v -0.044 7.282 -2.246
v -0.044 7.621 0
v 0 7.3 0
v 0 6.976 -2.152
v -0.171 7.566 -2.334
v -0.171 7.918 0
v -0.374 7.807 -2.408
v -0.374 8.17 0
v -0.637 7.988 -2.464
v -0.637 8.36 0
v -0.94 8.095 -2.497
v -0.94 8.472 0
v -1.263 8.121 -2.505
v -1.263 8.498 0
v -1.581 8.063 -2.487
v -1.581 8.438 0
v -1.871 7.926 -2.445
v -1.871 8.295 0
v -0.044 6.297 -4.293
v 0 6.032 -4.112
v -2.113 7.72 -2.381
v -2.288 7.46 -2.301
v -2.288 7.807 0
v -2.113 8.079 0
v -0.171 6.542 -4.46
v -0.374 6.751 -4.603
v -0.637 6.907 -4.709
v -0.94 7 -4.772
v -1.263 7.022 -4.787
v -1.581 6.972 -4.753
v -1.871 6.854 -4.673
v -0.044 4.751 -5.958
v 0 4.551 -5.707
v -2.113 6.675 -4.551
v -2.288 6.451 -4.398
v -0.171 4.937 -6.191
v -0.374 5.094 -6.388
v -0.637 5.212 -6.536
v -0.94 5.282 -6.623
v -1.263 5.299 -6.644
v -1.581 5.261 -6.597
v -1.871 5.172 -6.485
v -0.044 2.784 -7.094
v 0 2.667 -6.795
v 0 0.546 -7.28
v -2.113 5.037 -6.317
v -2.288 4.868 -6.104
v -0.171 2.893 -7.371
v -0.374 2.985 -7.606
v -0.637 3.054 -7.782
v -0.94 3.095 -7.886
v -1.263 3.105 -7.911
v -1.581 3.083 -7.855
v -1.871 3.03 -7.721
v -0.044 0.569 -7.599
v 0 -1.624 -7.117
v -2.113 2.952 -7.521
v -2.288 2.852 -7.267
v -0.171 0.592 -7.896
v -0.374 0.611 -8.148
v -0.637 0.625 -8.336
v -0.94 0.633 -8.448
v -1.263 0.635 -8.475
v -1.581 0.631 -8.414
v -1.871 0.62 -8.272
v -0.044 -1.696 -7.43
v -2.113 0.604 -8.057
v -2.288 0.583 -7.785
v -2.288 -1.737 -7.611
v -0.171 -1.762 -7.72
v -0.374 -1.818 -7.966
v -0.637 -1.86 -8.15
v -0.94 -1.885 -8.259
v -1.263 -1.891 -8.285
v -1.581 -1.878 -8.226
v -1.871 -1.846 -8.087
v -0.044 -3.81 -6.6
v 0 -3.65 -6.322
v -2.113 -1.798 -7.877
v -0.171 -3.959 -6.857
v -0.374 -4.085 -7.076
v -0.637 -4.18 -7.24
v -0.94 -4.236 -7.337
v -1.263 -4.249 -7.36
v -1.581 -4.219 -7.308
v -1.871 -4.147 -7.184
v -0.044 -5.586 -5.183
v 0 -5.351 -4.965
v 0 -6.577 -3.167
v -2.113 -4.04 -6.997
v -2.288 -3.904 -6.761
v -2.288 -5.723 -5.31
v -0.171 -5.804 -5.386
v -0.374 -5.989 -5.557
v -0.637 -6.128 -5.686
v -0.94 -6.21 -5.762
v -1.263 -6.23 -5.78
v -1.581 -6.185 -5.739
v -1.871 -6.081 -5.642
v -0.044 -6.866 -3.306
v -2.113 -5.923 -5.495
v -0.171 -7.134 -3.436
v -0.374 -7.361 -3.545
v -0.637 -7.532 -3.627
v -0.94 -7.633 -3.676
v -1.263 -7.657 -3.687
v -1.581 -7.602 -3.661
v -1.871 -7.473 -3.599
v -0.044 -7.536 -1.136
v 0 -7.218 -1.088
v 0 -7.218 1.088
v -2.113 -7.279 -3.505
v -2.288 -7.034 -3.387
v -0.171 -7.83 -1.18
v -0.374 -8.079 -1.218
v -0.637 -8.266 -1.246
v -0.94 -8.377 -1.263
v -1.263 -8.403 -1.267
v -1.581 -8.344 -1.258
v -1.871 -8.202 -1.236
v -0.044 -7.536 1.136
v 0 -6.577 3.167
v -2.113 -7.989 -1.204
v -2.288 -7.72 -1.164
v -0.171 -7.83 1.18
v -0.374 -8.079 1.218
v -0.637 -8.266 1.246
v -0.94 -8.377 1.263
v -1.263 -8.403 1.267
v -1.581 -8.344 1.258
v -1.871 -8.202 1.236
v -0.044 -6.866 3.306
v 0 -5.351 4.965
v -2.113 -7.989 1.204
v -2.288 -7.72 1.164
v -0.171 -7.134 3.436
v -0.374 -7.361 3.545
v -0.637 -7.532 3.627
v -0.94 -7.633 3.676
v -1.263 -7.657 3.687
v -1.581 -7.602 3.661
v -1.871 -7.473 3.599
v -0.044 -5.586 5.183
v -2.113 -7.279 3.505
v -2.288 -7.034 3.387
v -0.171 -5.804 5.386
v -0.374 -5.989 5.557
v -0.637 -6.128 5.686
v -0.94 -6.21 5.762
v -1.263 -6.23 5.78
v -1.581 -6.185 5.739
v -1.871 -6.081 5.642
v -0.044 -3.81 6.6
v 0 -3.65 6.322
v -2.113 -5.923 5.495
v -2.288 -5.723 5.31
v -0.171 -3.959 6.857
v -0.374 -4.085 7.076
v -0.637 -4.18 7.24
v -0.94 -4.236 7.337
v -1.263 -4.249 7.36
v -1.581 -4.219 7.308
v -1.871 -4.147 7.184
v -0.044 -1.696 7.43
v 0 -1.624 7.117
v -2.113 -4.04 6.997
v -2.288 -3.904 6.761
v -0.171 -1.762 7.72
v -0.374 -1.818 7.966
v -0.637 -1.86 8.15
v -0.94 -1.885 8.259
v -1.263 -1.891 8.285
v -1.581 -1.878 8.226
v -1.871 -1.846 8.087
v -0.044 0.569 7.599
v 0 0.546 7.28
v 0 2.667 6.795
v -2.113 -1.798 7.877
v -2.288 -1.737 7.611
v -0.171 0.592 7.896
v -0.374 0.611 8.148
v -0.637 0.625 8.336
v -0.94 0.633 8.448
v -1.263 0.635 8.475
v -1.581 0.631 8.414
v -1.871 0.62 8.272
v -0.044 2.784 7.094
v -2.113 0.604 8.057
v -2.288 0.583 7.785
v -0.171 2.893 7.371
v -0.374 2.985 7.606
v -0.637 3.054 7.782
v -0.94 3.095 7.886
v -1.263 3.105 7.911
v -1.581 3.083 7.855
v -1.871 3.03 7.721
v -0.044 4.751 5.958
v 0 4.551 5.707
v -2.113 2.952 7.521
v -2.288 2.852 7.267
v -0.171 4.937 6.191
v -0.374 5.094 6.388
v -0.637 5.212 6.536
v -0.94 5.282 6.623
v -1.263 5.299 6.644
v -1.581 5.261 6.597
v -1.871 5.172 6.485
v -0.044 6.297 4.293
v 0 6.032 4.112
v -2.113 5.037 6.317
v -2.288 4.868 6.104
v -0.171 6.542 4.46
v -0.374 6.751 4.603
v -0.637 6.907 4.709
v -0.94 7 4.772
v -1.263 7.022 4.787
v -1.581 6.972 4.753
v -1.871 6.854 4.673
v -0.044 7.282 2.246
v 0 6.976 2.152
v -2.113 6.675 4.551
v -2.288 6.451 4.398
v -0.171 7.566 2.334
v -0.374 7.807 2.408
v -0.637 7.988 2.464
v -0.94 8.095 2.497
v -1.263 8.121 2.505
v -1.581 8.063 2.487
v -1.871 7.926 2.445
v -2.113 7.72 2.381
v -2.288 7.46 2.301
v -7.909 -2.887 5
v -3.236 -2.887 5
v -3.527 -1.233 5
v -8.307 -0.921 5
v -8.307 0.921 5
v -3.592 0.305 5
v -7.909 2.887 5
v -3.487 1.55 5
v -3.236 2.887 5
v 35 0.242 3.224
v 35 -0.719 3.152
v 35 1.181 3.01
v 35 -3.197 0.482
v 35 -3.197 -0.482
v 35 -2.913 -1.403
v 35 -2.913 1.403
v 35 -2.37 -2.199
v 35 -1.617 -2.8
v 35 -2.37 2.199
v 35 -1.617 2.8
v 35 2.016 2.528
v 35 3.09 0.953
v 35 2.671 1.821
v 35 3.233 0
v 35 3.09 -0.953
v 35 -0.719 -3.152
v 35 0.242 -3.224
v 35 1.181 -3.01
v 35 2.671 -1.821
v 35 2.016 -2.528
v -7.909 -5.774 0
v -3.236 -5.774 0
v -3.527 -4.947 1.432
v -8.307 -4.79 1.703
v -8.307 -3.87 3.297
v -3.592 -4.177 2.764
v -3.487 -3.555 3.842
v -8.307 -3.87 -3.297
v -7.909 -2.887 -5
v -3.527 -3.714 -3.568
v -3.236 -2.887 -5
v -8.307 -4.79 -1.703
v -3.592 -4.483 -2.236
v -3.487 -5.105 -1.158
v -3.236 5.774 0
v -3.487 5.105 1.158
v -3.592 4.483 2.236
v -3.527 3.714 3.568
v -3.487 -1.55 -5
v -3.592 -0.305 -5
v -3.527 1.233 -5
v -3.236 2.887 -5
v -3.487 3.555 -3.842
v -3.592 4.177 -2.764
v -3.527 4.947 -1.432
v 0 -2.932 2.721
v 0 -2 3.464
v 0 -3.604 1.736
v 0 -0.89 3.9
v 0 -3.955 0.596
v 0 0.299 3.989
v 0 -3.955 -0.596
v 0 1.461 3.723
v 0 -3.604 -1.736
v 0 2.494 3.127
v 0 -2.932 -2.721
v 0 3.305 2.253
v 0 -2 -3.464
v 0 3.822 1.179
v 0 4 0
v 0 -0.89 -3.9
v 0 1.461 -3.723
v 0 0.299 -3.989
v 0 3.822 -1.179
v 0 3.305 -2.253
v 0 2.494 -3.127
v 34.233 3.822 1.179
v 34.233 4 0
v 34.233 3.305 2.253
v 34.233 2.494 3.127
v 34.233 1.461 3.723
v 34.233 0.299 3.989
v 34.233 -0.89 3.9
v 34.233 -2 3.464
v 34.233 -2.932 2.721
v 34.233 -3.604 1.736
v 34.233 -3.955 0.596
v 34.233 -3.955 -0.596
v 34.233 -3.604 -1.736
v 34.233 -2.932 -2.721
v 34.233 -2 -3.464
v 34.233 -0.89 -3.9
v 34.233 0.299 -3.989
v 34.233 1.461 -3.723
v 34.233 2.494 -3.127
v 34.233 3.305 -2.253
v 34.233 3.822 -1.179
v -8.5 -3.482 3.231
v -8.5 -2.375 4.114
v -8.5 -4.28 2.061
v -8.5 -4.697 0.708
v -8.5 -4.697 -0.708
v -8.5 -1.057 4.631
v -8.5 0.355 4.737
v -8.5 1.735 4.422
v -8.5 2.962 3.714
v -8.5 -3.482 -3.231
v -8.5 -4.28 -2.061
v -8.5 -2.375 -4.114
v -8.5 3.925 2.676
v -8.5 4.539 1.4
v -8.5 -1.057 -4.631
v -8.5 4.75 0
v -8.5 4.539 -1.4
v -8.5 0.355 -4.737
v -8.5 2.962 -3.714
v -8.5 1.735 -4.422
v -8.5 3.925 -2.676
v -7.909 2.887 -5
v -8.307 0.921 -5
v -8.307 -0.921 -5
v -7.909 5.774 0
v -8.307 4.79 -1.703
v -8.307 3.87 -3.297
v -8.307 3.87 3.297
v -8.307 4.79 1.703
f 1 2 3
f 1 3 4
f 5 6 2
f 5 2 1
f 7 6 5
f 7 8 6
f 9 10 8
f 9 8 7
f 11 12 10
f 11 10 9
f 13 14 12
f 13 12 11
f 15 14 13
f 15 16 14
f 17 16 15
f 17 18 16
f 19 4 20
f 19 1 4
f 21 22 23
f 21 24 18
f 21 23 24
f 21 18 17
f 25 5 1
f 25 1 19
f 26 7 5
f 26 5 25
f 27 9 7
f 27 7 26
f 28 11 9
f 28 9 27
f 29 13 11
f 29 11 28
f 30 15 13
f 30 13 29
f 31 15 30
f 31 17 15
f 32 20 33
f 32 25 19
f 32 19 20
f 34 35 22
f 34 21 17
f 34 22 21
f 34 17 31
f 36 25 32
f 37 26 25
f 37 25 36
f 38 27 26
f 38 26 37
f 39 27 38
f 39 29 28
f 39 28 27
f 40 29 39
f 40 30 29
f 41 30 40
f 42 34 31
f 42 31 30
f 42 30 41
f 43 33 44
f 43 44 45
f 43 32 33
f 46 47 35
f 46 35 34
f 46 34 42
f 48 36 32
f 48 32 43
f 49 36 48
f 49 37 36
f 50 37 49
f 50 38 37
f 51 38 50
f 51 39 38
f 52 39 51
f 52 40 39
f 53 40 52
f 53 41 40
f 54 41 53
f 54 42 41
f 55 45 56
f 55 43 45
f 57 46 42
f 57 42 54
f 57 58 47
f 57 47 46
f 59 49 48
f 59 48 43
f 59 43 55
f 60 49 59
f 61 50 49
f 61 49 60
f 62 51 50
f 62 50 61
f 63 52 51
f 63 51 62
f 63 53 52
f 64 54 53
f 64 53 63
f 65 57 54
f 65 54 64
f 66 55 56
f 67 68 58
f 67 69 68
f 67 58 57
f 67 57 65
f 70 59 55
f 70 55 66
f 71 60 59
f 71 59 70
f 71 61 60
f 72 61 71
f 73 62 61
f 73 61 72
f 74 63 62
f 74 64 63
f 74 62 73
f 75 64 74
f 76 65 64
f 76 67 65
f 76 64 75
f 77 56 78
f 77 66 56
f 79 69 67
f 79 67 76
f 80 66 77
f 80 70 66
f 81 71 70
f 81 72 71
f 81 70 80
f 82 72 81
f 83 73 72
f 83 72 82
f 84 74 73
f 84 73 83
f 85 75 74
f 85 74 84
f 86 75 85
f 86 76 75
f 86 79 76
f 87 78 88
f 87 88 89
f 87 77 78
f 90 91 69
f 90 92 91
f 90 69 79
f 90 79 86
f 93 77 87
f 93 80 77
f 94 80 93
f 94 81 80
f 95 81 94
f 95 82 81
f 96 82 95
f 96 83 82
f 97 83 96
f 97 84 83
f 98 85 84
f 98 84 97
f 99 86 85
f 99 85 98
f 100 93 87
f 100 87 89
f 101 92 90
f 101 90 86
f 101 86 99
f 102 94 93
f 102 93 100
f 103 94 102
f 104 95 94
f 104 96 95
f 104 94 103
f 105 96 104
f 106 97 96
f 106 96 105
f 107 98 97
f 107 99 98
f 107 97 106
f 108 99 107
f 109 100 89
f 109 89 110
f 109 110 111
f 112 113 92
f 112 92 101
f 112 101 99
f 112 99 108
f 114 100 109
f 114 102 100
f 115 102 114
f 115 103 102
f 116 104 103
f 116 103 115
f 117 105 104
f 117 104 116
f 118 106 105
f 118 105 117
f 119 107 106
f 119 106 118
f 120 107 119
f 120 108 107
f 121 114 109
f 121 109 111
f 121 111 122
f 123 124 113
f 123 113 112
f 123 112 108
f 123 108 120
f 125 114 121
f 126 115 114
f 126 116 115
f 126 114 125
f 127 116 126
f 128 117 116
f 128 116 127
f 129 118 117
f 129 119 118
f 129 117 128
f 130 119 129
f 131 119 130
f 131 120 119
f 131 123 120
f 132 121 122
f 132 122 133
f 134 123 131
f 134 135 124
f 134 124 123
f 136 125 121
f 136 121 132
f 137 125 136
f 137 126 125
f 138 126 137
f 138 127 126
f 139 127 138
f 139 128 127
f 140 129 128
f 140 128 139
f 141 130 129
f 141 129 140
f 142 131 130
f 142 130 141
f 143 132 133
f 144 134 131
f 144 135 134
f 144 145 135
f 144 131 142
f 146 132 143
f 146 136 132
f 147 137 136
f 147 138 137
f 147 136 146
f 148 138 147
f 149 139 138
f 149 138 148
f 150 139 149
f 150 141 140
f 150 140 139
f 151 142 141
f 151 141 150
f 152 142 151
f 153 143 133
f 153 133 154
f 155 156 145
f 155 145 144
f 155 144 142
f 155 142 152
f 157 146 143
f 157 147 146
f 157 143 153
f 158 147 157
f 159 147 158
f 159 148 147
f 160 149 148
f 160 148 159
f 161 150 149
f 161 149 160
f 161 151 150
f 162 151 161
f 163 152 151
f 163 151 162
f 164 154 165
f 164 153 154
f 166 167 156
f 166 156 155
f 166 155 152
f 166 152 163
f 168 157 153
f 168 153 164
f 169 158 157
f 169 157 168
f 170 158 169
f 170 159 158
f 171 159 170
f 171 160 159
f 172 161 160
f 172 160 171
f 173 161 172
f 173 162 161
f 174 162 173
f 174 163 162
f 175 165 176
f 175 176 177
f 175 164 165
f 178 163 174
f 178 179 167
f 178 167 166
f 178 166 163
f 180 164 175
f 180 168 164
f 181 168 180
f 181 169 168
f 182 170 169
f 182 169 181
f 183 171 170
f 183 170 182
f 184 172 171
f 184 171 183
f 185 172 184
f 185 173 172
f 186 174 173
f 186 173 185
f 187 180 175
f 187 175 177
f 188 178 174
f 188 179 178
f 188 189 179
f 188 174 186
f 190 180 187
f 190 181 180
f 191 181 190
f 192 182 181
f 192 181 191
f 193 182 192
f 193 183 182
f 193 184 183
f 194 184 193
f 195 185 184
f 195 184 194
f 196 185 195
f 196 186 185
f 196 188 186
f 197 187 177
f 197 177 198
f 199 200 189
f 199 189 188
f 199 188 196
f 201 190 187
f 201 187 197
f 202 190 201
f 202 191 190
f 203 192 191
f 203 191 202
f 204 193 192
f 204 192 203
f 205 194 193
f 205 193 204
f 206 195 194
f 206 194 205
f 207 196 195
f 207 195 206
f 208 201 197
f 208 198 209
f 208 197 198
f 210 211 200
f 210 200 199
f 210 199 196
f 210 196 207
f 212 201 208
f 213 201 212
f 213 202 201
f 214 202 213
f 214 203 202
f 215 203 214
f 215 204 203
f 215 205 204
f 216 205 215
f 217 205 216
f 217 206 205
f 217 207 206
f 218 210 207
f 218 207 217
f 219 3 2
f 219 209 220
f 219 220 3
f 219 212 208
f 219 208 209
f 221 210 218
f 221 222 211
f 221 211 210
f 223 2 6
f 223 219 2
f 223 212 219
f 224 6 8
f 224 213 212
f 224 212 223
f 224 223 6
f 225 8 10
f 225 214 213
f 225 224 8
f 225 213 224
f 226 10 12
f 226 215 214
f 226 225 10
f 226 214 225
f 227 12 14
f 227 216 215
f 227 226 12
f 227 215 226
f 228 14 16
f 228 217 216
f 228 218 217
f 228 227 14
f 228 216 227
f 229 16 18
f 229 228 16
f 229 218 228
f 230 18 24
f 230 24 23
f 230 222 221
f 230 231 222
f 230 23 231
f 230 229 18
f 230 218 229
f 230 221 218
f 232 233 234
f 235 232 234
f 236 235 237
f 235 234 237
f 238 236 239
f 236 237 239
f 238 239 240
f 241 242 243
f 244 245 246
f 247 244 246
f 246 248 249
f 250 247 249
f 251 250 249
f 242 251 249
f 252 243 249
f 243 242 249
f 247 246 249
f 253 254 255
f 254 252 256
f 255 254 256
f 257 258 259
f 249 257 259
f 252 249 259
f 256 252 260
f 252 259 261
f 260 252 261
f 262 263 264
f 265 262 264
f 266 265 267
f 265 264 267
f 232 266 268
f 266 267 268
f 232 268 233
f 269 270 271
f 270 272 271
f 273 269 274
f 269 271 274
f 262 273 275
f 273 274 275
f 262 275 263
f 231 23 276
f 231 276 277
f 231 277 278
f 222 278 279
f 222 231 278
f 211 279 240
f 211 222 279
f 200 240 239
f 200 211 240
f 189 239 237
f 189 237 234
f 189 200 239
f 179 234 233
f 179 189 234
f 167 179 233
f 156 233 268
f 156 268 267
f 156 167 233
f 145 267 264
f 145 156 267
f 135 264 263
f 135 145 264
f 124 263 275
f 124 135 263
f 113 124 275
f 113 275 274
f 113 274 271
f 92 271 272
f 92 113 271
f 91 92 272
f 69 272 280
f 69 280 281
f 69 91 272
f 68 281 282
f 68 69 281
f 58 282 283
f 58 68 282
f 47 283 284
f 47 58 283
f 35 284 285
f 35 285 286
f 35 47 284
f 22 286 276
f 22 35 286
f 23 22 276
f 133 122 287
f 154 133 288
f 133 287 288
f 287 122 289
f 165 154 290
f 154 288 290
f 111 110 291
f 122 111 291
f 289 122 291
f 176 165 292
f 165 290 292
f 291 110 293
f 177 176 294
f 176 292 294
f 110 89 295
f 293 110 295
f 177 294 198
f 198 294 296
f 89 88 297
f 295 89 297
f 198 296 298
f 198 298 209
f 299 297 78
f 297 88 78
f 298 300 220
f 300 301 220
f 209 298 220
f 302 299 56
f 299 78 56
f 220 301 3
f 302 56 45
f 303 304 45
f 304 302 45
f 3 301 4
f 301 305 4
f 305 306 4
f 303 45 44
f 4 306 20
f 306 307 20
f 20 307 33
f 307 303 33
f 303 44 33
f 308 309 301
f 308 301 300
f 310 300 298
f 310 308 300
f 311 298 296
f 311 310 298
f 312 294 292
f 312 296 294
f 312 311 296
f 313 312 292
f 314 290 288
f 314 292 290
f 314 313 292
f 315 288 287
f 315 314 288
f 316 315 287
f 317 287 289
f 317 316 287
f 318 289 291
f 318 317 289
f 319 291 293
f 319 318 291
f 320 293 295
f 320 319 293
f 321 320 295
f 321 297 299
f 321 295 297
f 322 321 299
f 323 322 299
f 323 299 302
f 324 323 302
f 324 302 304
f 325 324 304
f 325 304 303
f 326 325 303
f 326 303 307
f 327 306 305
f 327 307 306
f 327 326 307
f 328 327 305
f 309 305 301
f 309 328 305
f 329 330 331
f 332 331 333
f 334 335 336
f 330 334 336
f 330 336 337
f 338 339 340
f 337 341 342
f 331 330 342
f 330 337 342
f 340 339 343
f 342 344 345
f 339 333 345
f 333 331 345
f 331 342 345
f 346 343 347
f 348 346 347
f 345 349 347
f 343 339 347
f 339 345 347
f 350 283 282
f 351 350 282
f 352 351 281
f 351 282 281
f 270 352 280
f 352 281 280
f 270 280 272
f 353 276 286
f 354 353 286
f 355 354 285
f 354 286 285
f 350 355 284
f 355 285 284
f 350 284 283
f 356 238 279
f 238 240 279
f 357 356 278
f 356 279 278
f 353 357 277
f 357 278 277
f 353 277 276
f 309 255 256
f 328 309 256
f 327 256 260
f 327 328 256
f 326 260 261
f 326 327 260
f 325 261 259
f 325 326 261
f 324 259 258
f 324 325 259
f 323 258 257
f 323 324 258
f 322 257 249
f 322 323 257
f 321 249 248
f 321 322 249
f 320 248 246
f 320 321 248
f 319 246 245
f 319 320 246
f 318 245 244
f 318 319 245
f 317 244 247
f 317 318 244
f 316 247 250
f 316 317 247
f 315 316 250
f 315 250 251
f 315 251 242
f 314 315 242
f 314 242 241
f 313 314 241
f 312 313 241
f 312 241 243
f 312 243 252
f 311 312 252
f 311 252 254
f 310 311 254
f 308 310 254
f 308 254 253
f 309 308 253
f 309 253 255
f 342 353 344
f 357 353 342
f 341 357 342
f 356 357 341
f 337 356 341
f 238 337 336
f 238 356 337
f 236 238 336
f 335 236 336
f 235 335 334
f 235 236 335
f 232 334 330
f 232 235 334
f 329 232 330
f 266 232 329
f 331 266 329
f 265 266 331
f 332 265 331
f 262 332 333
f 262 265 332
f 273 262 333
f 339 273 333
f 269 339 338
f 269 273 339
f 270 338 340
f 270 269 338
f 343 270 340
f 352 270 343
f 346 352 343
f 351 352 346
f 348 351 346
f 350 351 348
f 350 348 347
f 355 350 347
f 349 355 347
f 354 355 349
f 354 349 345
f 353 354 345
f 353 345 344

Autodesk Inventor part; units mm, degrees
ref_plane "YZ Plane" through (0, 0, 0) normal (1, 0, 0) x (0, 1, 0)
ref_plane "XZ Plane" through (0, 0, 0) normal (0, 1, 0) x (-1, 0, 0)
sketch "Sketch1" plane through (0, 0, 0) normal (0, 0, 1) x (1, 0, 0)
  line L0 (-3.825, 0) -> (-3.825, 4.5101)
  line L1 (0, 7.3) -> (0, 4)
  line L2 (13, 4) -> (35, 4)
  line L3 (35, 4) -> (35, 0)
  line L4 (35, 0) -> (-3.825, 0)
  arc A0 (0, 7.3) -> (-2.2876, 7.8071) centre (-1.2, 7.3) ccw
  line L5 (0, -1.745) -> (0, 10.4702) projected
  line L6 (-11.59, 0) -> (42.765, 0) projected
  line L7 (0, 4) -> (0.0001, 4)
  line L8 (0.0001, 4) -> (0.0001, 4)
  line L9 (0.0001, 4) -> (12.2332, 4)
  line L10 (12.2332, 4) -> (13, 4)
  line L11 (-3.825, 4.5101) -> (-2.2876, 7.8071)
  line L12 (0.0001, 4) -> (13, 4) construction
  line L13 (13, 4) -> (13, 0) construction
  dimension "d0" = 1.2
  dimension "d1" = 35
  dimension "d2" = 22
  dimension "d3" = 17
  dimension "d4" = 8
  dimension "d5" = 3.825
  dimension "d15" = 8
  dimension "d16" = 8
  dimension "d17" = 0.0001
  dimension "d18" = 0.7668
  dimension "d19" = 25
revolve "Body" add sketch "Sketch1" angle 360 about axis through (35, 0, 0) along (-1, 0, 0)
sketch "Sketch2" plane through (0, 0, 0) normal (1, 0, 0) x (0, 0, -1)
  line L0 (5, 2.8868) -> (5, -2.8868)
  line L1 (5, -2.8868) -> (0, -5.7735)
  line L2 (0, -5.7735) -> (-5, -2.8868)
  line L3 (-5, -2.8868) -> (-5, 2.8868)
  line L4 (-5, 2.8868) -> (0, 5.7735)
  line L5 (0, 5.7735) -> (5, 2.8868)
  point P0 (0, 0)
  point P1 (0, 0)
  dimension "d23" = 10
extrude "Head" add sketch "Sketch2" against normal blind 8.5
sketch "Sketch3" plane through (0, 0, 0) normal (0, 0, 1) x (1, 0, 0)
  line L0 (-8.5, 4.75) -> (-8.5, 5.7735)
  line L1 (-8.5, 5.7735) -> (-7.9091, 5.7735)
  line L2 (-7.9091, 5.7735) -> (-8.5, 4.75)
  line L3 (-9.5528, 0) -> (-2.183, 0) projected
  line L4 (-8.5, 5.7735) -> (-8.5, 2.8868) projected
  line L5 (-3.2359, 5.7735) -> (-8.5, 5.7735) projected
  point P0 (-8.5, 2.8868)
  dimension "d8" = 30
  dimension "d22" = 9.5
revolve "Chamfer1" cut sketch "Sketch3" angle 360 about axis through (-10, 0, 0) along (1, 0, 0)
thread "Thread" size "M8x1.25" class "6g" standard "ISO Metric profile" length 22
chamfer "Chamfer2" distance 0.7668 distance2 0.7668 1 edges at (35, -4, 0) measured on face at (35, 1.5232, 1.2467)
ref_plane "Work Plane1" through (10.95, 0, 0) normal (0, 0, -1) x (1, 0, 0)
equation "\"d0\" = PHH"
equation "\"d1\" = NLG"
equation "\"d2\" = GEL"
equation "\"d3\" = LADI"
equation "\"d4\" = GD"
equation "\"d5\" = 0.45 * KOH"
equation "\"d15\" = SD2"
equation "\"d16\" = BDM"
equation "\"d18\" = GAL"
equation "\"d19\" = KEWI"
equation "\"d23\" = SW"
equation "\"d6\" = KOH"
equation "\"d8\" = ANG1"
equation "\"d22\" = SW0"
equation "\"d10\" = GEL"
equation "\"d13\" = -0.5 * SPD + 0.5 * GD"
equation "\"d14\" = GUL"
equation "\"NLG\" = 35"
equation "\"GD\" = NND"
equation "\"BDM\" = NND"
equation "\"KOH\" = 8.5"
equation "\"GEL\" = 22"
equation "\"LADI\" = 17"
equation "\"SW\" = 10"
equation "\"PHH\" = RR"
equation "\"SW0\" = 9.5"
equation "\"SPD\" = NND - 1.2269 * PTC"
equation "\"SD2\" = NND"
equation "\"SD\" = 0"
equation "\"ANG1\" = 30deg"
equation "\"KEWI\" = 25deg"
equation "\"GAL\" = 0.61345 * PTC"
equation "\"GUL\" = 0.61345 * PTC"
equation "\"PTC\" = 1.25"
equation "\"THREADDIA\" = 8"
equation "\"E0\" = 1.155 * SW"
equation "\"TOA\" = 30deg"
equation "\"NND\" = 8"
equation "\"GD1\" = THREADDIA - 1.2269 * PTC"
equation "\"KOH1\" = 3.8"
equation "\"RR\" = 1.2"
properties part number "ISO 4162 - M8 x 35" material "Stainless Steel"
